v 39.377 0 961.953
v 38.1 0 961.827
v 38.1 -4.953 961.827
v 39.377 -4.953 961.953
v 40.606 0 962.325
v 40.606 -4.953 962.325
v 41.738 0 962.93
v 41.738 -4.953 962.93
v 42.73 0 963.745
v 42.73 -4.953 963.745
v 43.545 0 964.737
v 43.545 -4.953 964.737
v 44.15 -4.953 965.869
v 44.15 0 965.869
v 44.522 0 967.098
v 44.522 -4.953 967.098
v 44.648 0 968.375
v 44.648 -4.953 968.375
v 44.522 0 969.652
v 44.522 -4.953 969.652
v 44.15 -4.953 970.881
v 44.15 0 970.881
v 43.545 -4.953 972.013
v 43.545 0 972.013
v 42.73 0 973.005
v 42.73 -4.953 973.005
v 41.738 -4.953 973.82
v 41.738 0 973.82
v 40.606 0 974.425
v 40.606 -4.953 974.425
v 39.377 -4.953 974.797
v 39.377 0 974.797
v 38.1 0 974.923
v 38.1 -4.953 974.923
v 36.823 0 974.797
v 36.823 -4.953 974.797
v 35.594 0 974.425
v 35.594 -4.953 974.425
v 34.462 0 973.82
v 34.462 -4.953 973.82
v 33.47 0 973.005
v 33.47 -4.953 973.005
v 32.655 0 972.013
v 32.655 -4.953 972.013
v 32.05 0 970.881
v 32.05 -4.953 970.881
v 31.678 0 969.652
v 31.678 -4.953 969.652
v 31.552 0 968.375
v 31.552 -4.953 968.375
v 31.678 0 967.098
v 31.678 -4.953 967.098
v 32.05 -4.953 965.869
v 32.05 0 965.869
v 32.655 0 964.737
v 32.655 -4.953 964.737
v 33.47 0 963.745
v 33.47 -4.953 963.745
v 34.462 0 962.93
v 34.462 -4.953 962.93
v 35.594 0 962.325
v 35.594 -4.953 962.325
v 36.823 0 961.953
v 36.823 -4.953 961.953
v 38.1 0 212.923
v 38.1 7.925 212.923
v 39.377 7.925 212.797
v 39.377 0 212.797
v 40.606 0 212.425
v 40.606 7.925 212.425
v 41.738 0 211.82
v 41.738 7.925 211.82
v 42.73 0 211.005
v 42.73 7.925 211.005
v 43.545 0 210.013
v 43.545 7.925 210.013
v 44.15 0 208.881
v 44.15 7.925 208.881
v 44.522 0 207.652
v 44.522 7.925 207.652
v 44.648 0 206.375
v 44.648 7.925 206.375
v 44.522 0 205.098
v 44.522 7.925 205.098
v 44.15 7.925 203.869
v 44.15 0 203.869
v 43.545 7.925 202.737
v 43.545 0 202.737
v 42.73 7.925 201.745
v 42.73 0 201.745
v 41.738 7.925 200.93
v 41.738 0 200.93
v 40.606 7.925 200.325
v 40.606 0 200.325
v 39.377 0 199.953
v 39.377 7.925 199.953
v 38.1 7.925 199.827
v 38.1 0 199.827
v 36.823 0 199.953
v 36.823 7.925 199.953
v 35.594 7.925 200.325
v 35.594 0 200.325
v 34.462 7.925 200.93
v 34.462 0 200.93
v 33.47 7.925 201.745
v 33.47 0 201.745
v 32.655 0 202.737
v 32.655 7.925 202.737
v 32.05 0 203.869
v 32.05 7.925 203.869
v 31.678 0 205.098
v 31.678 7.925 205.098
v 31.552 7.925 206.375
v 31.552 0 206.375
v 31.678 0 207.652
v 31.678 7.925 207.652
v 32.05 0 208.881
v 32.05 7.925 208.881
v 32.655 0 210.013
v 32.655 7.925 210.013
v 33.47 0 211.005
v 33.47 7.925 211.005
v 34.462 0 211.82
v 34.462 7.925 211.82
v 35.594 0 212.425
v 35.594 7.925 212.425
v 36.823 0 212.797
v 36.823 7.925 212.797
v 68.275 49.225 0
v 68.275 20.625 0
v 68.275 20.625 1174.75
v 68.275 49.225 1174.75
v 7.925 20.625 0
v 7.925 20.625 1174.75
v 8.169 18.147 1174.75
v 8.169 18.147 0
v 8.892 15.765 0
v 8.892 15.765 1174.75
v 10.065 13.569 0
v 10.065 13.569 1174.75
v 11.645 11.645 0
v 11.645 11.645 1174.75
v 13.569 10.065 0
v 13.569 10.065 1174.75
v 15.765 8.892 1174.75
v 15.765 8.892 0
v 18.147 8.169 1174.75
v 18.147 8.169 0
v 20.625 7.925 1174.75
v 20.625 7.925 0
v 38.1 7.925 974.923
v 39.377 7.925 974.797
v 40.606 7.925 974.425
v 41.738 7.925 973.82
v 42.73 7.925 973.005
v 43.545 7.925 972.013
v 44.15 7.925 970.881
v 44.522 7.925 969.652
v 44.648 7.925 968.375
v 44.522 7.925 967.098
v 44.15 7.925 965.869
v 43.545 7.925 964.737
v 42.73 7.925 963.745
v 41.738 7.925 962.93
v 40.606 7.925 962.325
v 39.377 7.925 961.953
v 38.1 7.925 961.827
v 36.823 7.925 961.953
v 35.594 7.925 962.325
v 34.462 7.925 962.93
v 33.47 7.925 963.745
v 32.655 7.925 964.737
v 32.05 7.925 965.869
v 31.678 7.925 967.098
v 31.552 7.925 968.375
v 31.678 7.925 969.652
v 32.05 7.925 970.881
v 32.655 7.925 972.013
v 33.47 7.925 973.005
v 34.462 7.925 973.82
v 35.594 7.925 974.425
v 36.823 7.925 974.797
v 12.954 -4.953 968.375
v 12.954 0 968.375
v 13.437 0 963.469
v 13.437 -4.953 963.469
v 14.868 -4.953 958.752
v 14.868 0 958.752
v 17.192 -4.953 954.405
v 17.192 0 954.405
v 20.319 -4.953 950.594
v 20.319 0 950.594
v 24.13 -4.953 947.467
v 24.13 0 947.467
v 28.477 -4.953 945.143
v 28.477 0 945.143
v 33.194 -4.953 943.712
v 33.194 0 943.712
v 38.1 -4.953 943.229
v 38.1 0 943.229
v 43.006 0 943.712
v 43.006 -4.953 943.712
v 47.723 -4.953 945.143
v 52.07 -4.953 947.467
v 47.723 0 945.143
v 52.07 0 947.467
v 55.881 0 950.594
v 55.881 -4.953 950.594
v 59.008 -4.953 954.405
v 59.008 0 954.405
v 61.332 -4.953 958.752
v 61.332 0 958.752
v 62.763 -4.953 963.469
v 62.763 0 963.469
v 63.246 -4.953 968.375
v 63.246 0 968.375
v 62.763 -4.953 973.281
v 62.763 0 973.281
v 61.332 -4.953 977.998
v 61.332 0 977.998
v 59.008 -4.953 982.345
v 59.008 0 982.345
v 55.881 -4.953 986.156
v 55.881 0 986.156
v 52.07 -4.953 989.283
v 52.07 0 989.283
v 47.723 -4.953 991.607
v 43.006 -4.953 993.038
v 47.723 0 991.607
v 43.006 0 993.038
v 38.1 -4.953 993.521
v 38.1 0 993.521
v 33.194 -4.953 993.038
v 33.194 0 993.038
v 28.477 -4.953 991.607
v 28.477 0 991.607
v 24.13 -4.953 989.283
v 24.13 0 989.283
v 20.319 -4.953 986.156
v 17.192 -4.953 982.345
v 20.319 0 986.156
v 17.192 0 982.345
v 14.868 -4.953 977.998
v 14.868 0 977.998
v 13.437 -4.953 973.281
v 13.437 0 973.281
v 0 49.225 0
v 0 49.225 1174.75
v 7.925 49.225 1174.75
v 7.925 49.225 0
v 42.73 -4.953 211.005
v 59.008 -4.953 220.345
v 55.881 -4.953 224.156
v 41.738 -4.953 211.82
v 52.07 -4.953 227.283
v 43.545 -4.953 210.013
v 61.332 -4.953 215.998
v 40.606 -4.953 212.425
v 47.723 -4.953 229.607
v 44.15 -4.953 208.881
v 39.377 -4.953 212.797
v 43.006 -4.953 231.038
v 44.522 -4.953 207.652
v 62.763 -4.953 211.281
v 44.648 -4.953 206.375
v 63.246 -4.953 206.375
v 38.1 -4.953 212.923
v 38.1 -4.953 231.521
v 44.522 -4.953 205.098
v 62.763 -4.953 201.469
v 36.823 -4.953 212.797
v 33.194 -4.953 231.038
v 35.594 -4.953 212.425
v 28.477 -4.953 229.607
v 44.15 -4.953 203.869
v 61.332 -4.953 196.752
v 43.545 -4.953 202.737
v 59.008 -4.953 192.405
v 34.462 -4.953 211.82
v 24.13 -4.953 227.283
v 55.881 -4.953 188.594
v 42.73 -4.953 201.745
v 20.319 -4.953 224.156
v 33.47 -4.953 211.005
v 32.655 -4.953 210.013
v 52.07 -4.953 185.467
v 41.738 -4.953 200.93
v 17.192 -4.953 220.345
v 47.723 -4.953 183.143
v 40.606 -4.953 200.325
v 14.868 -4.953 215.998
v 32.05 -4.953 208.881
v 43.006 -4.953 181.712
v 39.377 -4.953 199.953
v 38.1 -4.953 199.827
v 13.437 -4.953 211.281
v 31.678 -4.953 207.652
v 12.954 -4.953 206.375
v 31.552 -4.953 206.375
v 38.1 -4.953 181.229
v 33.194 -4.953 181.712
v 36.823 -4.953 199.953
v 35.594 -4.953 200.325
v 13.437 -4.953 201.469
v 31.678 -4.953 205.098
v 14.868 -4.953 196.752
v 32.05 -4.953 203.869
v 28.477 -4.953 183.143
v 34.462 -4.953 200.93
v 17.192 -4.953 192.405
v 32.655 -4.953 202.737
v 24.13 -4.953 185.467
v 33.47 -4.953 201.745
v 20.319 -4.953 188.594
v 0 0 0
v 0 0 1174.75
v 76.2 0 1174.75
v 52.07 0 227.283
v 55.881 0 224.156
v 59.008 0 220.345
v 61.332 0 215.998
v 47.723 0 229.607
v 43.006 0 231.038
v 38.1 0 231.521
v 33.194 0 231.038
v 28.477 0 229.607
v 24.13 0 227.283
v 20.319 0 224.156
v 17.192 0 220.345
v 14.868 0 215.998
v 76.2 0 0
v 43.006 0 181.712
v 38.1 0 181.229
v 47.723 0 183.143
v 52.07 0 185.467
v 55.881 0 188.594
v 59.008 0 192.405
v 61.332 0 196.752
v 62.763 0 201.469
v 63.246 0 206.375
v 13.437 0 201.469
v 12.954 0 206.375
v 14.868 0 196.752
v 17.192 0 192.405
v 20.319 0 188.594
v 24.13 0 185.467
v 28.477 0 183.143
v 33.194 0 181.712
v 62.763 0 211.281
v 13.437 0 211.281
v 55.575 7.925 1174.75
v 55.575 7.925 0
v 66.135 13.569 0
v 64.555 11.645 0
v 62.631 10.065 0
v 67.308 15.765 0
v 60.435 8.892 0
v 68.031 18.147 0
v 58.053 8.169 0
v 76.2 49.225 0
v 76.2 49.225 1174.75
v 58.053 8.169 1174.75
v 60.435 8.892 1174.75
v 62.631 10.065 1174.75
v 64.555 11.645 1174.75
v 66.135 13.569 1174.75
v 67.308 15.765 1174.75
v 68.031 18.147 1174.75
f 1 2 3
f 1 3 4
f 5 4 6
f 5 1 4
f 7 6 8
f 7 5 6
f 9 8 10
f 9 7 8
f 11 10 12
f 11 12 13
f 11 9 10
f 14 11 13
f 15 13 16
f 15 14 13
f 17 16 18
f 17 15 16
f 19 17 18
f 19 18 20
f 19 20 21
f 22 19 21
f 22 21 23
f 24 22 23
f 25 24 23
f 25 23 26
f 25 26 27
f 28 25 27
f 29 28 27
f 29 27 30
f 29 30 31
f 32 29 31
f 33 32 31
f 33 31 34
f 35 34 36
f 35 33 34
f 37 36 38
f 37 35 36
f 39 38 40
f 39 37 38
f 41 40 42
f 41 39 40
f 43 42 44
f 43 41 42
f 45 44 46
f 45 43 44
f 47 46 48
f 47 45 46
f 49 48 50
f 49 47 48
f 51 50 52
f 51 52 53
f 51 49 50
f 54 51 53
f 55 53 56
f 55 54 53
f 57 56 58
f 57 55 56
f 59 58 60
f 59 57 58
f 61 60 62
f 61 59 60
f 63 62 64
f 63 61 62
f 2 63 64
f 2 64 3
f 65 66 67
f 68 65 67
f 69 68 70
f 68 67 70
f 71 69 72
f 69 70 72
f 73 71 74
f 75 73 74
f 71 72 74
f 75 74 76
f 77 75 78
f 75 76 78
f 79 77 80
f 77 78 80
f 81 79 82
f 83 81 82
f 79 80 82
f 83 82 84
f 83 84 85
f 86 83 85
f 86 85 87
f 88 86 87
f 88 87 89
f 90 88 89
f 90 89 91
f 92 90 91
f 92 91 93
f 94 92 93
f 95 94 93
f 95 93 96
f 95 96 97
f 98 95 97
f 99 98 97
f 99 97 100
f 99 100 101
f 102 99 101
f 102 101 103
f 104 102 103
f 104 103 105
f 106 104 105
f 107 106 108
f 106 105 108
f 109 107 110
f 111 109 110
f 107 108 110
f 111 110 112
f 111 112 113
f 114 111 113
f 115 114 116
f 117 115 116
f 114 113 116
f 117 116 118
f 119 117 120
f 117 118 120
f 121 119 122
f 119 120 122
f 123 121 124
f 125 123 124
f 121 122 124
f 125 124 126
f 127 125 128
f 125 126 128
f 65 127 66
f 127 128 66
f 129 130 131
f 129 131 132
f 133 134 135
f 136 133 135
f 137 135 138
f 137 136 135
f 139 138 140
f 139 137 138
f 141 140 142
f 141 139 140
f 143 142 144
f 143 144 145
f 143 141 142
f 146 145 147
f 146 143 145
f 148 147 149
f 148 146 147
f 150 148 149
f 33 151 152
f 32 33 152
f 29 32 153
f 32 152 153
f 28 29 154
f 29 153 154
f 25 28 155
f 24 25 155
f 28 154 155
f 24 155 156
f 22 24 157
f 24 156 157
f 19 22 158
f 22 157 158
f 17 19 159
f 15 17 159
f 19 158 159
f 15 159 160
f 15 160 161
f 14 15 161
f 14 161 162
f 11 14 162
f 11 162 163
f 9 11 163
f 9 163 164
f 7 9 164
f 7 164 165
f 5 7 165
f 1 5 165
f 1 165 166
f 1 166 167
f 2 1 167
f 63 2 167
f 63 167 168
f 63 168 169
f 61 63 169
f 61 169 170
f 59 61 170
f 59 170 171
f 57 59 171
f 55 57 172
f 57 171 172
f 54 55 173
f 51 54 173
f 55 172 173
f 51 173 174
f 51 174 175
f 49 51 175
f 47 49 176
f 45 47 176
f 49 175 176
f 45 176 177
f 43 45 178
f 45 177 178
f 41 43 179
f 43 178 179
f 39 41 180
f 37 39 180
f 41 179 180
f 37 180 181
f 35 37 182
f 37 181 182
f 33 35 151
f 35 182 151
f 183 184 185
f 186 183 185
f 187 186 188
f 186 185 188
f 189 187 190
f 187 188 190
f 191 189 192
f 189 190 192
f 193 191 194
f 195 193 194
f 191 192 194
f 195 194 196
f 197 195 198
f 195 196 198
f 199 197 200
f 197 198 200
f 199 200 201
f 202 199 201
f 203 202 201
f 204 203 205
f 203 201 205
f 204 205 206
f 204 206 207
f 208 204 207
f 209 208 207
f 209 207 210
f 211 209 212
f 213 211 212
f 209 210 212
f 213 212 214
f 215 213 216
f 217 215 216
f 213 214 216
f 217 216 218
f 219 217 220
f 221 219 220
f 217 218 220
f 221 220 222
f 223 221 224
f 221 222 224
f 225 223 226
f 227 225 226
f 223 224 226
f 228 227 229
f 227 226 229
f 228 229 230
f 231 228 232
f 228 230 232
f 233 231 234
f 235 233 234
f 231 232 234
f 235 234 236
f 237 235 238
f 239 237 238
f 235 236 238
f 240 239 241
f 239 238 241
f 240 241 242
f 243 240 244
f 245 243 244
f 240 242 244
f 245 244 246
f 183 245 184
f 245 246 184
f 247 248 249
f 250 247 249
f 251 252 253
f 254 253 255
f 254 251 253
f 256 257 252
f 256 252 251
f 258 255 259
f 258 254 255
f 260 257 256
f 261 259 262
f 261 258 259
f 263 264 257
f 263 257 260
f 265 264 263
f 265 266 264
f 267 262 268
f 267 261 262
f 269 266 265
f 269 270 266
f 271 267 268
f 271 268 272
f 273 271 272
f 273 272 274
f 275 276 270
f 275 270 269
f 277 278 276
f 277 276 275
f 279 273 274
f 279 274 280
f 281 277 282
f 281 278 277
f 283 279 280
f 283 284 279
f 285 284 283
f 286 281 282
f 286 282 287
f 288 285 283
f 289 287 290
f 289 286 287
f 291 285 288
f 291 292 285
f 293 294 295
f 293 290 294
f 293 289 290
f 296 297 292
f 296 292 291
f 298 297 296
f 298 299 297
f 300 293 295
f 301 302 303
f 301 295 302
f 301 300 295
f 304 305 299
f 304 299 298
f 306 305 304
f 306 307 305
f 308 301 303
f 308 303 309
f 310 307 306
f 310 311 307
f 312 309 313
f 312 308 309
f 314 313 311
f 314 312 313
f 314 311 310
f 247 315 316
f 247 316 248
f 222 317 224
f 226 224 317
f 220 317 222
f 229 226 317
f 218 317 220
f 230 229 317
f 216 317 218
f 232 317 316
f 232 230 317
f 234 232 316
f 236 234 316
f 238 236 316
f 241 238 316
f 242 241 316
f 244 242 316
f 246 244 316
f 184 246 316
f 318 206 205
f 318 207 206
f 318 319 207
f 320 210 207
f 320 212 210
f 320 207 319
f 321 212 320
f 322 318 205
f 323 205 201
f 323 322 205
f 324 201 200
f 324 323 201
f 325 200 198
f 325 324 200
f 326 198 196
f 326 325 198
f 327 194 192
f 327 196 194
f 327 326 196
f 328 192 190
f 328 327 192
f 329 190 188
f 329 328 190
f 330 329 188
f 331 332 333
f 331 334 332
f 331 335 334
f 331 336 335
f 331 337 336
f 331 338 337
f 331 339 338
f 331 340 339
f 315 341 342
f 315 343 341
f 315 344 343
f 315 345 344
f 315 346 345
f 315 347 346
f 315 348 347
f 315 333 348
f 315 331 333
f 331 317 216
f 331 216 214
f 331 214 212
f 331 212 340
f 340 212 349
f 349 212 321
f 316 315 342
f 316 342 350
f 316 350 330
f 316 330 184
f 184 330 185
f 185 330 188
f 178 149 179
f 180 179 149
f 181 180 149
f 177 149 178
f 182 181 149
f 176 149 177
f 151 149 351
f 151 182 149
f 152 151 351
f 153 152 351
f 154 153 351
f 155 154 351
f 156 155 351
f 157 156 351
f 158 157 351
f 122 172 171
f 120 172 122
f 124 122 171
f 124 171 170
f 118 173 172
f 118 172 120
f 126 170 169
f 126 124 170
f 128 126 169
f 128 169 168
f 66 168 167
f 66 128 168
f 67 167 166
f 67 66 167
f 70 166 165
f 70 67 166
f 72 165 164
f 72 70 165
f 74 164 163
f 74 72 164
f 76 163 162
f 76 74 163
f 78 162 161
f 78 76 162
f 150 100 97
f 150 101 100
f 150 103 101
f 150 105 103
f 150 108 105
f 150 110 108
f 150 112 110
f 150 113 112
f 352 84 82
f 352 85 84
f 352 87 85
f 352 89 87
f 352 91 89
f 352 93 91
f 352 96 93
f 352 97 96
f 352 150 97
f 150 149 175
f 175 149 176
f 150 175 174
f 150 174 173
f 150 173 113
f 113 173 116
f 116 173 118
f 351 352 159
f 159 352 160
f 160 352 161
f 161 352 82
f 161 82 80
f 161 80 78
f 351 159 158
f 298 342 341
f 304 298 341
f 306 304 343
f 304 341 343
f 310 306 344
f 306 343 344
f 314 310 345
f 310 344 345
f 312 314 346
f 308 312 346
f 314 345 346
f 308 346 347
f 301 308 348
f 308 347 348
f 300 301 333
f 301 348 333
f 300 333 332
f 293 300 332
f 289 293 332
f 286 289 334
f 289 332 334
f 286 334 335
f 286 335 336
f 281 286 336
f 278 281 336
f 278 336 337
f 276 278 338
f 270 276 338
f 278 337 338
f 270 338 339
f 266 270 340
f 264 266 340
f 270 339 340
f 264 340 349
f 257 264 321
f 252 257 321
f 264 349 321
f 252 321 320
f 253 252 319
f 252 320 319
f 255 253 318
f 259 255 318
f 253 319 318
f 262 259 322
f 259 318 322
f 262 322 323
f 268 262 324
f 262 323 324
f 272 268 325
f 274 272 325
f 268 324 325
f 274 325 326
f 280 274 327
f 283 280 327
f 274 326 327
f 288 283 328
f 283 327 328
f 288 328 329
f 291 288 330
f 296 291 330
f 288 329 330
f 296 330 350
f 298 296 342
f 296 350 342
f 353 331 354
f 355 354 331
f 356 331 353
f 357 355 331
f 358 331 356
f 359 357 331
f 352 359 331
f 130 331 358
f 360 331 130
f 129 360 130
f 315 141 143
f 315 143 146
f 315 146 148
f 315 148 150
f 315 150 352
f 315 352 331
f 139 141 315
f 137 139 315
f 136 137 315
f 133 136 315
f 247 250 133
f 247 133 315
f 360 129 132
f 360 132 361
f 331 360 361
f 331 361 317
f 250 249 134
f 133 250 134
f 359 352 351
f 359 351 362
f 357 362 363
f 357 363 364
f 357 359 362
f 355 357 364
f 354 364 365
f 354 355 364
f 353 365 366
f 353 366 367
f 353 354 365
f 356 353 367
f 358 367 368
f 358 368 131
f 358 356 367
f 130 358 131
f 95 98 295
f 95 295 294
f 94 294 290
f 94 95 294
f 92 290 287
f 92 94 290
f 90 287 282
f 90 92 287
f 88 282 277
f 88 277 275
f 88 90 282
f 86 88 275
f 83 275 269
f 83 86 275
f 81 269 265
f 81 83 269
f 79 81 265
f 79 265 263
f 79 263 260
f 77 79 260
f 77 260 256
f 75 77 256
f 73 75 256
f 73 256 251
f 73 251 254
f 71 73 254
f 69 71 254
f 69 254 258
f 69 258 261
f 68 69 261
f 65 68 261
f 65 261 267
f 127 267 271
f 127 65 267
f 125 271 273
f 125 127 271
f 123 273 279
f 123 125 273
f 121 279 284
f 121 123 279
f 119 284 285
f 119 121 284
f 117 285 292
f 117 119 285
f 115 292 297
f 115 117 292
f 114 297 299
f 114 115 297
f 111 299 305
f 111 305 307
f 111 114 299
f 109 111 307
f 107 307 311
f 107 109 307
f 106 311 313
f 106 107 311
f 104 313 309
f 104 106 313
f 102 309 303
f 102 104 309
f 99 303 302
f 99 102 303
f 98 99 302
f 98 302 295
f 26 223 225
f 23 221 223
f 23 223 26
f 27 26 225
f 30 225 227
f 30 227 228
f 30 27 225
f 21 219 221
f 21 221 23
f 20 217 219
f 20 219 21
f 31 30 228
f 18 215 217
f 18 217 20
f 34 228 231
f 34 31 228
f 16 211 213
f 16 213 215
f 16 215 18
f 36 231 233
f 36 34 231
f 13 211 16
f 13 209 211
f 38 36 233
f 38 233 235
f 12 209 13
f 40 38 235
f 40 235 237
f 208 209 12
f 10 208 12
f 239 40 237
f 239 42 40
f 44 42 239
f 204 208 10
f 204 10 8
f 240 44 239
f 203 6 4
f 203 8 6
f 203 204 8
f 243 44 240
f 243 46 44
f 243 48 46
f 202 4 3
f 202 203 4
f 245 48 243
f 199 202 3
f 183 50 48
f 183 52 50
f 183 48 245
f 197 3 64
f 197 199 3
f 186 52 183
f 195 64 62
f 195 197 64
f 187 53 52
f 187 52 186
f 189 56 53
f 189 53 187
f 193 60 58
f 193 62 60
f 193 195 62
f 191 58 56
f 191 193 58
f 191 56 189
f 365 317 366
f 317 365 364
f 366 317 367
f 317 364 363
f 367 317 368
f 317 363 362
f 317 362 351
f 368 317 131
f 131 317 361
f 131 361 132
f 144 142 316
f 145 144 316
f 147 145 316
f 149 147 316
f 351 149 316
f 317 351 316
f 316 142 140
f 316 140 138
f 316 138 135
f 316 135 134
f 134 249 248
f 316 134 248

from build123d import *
from build123d.topology import SkipClean

# Parameters (mm, degrees)
BOSS_EXTRUDE1_DEPTH     = 1174.75
F_1_2_CLEARANCE_HOLE1_D = 13.09624
SKETCH116_R             = 25.146
SKETCH116_R_2           = 6.54812
BOSS_EXTRUDE2_DEPTH     = 4.953


with BuildPart() as part:
    # Sketch113 → Boss-Extrude1 (new body)
    with BuildSketch(Plane.XY):
        with BuildLine():
            Line((0, 0), (0, 49.2252))
            Line((0, 49.2252), (7.9248, 49.2252))
            Line((7.9248, 49.2252), (7.9248, 20.6248))
            ThreePointArc((7.9248, 20.6248), (11.644543879, 11.644543879), (20.6248, 7.9248))
            Line((20.6248, 7.9248), (55.5752, 7.9248))
            ThreePointArc((55.5752, 7.9248), (64.555456121, 11.644543879), (68.2752, 20.6248))
            Line((68.2752, 20.6248), (68.2752, 49.2252))
            Line((68.2752, 49.2252), (76.2, 49.2252))
            Line((76.2, 49.2252), (76.2, 0))
            Line((76.2, 0), (0, 0))
        make_face()
    extrude(amount=BOSS_EXTRUDE1_DEPTH)

    # 1/2 Clearance Hole1 (through all)
    with Locations(Plane(origin=(38.1, 0, 206.375), x_dir=(0, 0, -1), z_dir=(0, -1, 0))):
        with Locations((0, 0), (-762, 0)):
            Hole(F_1_2_CLEARANCE_HOLE1_D / 2)

    # Sketch116 → Boss-Extrude2 (add)
    # profile 1 of 2: a face of its own
    with SkipClean():  # the faces are left unmerged after this step: merging them gives an invalid solid
        with BuildSketch(Plane.XZ):
            with Locations((38.1, 968.375)):
                Circle(SKETCH116_R)
            with Locations((38.1, 968.375)):
                Circle(SKETCH116_R_2, mode=Mode.SUBTRACT)
        # profile 2 of 2: a face of its own
        with BuildSketch(Plane.XZ):
            with Locations((38.1, 206.375)):
                Circle(SKETCH116_R)
            with Locations((38.1, 206.375)):
                Circle(SKETCH116_R_2, mode=Mode.SUBTRACT)
        extrude(amount=BOSS_EXTRUDE2_DEPTH)
    add(part.part.scale(1), mode=Mode.REPLACE)  # the faces are merged on a copy


solid = part.part
